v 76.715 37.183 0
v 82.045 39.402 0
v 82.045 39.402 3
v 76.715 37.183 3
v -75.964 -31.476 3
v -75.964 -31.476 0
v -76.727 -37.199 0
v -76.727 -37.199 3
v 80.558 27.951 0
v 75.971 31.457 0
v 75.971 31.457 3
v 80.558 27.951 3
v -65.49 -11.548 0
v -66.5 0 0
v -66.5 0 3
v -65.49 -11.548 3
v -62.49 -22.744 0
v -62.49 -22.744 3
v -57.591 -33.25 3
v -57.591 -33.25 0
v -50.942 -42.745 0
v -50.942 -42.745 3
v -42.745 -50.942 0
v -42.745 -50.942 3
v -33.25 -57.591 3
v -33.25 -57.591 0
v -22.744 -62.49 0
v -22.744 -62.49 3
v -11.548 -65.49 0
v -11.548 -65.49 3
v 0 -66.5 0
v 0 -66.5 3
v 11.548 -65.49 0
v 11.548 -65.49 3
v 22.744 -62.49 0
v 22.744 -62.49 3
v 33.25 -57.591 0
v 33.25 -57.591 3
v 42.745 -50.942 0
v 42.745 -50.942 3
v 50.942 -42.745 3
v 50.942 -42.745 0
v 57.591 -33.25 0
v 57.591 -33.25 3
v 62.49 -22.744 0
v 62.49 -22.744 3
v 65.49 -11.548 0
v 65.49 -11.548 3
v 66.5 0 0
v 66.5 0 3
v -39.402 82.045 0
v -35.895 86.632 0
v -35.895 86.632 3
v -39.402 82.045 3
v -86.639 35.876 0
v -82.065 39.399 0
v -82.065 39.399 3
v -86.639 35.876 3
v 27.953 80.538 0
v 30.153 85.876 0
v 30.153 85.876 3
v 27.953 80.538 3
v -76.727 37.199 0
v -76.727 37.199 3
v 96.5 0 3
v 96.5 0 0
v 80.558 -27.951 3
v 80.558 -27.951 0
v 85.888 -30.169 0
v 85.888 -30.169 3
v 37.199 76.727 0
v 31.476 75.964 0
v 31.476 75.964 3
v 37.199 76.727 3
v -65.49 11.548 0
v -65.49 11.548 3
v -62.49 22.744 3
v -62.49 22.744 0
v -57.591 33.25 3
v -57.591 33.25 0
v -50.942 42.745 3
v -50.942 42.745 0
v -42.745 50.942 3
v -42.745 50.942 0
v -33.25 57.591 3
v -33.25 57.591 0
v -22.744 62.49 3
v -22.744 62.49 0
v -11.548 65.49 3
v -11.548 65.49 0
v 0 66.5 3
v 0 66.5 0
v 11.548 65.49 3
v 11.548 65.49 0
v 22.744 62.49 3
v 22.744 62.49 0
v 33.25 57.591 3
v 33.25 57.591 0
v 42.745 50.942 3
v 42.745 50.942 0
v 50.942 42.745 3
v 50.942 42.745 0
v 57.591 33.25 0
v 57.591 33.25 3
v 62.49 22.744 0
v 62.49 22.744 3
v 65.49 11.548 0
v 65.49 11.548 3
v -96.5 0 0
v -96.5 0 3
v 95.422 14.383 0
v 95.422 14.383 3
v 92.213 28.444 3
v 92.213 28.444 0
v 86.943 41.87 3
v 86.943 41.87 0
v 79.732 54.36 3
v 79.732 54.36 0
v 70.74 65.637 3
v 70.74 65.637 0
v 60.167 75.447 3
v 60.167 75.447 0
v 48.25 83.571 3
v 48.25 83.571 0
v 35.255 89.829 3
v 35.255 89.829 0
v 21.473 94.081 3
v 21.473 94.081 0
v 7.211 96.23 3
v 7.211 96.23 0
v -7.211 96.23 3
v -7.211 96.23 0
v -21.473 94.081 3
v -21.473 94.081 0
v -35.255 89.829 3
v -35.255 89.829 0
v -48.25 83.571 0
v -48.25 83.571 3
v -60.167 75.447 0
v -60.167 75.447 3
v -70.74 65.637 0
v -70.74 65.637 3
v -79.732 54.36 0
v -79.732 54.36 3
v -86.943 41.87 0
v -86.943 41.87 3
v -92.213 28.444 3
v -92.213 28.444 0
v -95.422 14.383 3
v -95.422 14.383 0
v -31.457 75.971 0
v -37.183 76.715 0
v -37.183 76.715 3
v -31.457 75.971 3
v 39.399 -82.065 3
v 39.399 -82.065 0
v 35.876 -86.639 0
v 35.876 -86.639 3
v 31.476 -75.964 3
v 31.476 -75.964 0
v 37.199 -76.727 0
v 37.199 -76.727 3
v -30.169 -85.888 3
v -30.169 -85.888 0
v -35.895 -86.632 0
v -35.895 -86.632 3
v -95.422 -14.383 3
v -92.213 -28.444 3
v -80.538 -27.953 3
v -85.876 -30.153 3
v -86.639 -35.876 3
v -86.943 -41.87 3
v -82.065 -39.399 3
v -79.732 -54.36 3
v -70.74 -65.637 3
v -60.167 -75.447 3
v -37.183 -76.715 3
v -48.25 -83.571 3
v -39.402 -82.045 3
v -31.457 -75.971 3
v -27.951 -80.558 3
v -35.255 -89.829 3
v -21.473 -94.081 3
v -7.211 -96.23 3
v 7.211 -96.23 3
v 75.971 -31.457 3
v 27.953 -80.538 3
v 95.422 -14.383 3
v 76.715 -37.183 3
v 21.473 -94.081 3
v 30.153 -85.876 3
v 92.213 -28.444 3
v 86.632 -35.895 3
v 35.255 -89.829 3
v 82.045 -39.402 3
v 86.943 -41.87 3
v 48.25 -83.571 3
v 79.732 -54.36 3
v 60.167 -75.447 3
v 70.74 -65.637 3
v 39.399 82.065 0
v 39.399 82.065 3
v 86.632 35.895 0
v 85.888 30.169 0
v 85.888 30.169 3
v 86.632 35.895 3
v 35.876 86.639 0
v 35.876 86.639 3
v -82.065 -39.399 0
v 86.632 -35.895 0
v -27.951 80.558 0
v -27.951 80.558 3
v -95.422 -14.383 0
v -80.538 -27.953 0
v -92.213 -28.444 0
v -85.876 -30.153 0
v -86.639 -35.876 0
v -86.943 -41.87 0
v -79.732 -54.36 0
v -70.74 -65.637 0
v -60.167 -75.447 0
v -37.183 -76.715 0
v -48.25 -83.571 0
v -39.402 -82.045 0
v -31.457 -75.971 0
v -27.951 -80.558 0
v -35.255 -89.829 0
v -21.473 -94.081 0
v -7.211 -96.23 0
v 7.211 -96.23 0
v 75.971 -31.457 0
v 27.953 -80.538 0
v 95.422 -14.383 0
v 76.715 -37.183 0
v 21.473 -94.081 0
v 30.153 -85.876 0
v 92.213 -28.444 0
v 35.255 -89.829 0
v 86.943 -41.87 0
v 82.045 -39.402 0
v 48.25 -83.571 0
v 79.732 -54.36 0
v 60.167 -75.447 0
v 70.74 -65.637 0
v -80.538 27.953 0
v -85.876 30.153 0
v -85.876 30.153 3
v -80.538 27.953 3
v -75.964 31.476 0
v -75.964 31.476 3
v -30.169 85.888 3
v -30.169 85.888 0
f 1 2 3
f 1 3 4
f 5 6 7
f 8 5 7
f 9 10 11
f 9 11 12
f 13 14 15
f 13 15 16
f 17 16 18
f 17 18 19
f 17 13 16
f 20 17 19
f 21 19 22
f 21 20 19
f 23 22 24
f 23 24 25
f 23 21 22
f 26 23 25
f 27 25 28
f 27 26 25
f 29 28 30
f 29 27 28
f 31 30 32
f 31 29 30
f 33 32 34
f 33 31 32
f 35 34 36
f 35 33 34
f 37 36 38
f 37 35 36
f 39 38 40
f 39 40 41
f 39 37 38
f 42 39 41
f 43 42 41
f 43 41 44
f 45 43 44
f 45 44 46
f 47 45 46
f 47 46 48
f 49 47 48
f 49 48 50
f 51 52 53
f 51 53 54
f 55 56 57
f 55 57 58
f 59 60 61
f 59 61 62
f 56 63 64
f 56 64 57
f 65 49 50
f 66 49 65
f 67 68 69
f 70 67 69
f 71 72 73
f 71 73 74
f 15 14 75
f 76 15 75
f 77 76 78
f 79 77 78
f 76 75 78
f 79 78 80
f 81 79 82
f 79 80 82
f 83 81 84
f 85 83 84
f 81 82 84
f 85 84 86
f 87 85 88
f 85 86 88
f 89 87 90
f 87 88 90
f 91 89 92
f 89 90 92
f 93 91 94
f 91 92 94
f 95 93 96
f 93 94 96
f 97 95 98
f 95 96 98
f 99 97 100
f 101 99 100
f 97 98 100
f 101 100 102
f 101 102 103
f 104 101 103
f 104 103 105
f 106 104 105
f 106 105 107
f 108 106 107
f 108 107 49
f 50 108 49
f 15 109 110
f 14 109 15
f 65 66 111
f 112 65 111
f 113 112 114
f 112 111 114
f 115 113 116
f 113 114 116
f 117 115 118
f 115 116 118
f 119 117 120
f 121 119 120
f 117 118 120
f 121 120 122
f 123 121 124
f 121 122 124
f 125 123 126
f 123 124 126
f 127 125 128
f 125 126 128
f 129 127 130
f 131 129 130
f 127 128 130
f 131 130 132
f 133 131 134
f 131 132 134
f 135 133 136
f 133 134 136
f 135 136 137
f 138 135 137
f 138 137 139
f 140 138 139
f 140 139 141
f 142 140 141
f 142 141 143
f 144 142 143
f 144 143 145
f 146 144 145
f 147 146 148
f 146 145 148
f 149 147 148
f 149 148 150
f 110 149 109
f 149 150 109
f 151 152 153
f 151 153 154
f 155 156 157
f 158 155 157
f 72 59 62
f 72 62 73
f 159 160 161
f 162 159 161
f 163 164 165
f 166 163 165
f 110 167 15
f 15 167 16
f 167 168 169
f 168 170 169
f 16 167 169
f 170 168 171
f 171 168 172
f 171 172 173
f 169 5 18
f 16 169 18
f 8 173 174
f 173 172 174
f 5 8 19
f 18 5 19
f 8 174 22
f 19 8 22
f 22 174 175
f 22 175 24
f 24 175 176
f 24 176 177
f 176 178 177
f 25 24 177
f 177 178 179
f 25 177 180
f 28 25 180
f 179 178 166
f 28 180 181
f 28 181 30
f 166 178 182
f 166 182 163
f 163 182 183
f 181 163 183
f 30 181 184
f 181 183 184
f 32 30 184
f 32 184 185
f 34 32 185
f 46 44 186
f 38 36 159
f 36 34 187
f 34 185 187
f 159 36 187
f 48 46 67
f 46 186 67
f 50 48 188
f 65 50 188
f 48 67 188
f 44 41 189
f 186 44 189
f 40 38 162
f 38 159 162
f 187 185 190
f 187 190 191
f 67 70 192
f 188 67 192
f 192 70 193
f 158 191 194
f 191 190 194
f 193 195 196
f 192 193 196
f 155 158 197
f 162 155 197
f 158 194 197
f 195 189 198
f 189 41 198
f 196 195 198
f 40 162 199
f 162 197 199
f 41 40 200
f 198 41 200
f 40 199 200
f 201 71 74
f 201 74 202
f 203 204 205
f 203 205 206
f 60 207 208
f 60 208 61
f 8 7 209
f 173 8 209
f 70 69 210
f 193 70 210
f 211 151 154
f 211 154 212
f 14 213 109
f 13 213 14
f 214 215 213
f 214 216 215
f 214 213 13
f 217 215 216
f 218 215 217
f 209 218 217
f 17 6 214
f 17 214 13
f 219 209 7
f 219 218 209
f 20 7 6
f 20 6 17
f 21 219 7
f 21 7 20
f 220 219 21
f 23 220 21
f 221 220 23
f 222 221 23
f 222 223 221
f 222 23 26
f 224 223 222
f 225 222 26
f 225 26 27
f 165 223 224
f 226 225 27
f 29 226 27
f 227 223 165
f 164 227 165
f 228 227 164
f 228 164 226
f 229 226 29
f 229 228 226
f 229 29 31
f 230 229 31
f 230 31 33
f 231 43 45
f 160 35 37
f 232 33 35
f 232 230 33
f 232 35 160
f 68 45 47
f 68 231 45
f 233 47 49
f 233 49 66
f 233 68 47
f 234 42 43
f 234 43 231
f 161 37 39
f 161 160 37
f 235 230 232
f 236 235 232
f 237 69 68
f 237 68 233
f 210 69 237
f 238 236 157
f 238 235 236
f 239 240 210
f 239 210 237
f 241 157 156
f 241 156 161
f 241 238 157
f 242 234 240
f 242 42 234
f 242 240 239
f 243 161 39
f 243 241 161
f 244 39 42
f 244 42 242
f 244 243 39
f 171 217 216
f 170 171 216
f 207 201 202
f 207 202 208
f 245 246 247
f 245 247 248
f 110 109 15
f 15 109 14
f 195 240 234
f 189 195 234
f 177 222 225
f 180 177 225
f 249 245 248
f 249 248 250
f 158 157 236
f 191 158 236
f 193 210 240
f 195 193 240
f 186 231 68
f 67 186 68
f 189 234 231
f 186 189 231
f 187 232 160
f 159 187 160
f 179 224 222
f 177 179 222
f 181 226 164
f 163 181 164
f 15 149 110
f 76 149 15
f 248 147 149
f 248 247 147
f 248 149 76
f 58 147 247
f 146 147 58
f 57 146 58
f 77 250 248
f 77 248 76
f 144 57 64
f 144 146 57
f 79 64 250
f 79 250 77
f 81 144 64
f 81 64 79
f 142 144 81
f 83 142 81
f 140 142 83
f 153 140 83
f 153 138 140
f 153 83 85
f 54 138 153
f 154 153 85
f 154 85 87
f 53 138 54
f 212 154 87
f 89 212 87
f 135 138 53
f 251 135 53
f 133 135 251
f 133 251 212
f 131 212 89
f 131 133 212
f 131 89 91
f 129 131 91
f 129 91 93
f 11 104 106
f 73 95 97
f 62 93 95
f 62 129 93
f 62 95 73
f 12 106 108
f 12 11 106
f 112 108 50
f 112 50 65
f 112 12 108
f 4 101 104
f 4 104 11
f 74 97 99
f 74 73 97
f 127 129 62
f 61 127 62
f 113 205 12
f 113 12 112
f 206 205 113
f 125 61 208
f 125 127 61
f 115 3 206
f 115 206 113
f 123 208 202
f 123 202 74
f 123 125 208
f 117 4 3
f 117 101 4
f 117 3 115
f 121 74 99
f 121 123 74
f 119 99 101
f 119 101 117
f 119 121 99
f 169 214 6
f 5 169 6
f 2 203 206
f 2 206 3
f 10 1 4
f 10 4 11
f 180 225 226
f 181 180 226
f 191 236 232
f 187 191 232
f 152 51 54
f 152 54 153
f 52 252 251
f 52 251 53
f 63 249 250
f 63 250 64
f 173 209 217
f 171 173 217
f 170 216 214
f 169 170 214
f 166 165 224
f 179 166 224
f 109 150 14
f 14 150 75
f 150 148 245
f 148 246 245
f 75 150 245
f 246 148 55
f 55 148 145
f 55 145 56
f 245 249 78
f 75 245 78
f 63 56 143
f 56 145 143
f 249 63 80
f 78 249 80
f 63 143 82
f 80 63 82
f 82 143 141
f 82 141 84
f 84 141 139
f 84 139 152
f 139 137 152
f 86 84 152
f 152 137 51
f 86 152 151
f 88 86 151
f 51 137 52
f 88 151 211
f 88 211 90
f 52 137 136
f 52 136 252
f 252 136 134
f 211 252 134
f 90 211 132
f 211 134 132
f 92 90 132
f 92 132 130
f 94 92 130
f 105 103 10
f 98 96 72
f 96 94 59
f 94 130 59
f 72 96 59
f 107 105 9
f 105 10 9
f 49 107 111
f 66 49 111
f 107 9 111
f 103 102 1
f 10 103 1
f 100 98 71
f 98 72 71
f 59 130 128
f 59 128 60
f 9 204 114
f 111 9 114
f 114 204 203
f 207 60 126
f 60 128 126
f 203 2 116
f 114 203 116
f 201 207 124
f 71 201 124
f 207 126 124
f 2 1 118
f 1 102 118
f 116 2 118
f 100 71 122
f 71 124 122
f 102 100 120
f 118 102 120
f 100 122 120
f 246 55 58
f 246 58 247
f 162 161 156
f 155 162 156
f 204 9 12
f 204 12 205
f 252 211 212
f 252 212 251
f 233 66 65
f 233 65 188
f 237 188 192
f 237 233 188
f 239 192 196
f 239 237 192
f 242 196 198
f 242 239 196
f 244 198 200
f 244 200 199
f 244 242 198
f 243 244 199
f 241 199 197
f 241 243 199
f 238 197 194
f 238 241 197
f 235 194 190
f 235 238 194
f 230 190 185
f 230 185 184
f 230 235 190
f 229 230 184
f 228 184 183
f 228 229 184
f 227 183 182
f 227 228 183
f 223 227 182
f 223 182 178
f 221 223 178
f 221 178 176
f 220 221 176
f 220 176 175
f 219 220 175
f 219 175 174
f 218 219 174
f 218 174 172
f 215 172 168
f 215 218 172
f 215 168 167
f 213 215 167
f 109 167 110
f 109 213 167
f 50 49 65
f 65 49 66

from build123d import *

# Parameters (mm, degrees)
F1_DEPTH = 3
F3_DEPTH = 3


with BuildPart() as f1:
    # F0 (on Top) → F1 (new body)
    with BuildSketch(Plane.XY):
        with BuildLine():
            ThreePointArc((96.5, 0), (0, 96.5), (-96.5, 0))
            Line((-96.5, 0), (-66.5, 0))
            ThreePointArc((-66.5, 0), (0, 66.5), (66.5, 0))
            Line((66.5, 0), (96.5, 0))
        make_face()
    extrude(amount=F1_DEPTH)

    # F2 (on Top) → F3 (cut)
    with BuildSketch(Plane.XY):
        Polygon((-76.727109, 37.198812), (-82.064975, 39.398928), (-86.639266, 35.876258), (-85.875689, 30.153472), (-80.537822, 27.953356), (-75.963532, 31.476026), align=None)
        Polygon((-31.457418, 75.97124), (-27.950727, 80.557791), (-30.169451, 85.88795), (-35.894867, 86.631558), (-39.401557, 82.045007), (-37.182833, 76.714848), align=None)
        Polygon((31.476026, 75.963532), (37.198812, 76.727109), (39.398928, 82.064975), (35.876258, 86.639266), (30.153472, 85.875689), (27.953356, 80.537822), align=None)
        Polygon((80.557791, 27.950727), (85.88795, 30.169451), (86.631558, 35.894867), (82.045007, 39.401557), (76.714848, 37.182833), (75.97124, 31.457418), align=None)
    extrude(amount=F3_DEPTH, mode=Mode.SUBTRACT)


with BuildPart() as f5_1:
    # F5: instance of F1
    add(f1.part.mirror(Plane.XZ))


solid = Compound([f1.part, f5_1.part])
